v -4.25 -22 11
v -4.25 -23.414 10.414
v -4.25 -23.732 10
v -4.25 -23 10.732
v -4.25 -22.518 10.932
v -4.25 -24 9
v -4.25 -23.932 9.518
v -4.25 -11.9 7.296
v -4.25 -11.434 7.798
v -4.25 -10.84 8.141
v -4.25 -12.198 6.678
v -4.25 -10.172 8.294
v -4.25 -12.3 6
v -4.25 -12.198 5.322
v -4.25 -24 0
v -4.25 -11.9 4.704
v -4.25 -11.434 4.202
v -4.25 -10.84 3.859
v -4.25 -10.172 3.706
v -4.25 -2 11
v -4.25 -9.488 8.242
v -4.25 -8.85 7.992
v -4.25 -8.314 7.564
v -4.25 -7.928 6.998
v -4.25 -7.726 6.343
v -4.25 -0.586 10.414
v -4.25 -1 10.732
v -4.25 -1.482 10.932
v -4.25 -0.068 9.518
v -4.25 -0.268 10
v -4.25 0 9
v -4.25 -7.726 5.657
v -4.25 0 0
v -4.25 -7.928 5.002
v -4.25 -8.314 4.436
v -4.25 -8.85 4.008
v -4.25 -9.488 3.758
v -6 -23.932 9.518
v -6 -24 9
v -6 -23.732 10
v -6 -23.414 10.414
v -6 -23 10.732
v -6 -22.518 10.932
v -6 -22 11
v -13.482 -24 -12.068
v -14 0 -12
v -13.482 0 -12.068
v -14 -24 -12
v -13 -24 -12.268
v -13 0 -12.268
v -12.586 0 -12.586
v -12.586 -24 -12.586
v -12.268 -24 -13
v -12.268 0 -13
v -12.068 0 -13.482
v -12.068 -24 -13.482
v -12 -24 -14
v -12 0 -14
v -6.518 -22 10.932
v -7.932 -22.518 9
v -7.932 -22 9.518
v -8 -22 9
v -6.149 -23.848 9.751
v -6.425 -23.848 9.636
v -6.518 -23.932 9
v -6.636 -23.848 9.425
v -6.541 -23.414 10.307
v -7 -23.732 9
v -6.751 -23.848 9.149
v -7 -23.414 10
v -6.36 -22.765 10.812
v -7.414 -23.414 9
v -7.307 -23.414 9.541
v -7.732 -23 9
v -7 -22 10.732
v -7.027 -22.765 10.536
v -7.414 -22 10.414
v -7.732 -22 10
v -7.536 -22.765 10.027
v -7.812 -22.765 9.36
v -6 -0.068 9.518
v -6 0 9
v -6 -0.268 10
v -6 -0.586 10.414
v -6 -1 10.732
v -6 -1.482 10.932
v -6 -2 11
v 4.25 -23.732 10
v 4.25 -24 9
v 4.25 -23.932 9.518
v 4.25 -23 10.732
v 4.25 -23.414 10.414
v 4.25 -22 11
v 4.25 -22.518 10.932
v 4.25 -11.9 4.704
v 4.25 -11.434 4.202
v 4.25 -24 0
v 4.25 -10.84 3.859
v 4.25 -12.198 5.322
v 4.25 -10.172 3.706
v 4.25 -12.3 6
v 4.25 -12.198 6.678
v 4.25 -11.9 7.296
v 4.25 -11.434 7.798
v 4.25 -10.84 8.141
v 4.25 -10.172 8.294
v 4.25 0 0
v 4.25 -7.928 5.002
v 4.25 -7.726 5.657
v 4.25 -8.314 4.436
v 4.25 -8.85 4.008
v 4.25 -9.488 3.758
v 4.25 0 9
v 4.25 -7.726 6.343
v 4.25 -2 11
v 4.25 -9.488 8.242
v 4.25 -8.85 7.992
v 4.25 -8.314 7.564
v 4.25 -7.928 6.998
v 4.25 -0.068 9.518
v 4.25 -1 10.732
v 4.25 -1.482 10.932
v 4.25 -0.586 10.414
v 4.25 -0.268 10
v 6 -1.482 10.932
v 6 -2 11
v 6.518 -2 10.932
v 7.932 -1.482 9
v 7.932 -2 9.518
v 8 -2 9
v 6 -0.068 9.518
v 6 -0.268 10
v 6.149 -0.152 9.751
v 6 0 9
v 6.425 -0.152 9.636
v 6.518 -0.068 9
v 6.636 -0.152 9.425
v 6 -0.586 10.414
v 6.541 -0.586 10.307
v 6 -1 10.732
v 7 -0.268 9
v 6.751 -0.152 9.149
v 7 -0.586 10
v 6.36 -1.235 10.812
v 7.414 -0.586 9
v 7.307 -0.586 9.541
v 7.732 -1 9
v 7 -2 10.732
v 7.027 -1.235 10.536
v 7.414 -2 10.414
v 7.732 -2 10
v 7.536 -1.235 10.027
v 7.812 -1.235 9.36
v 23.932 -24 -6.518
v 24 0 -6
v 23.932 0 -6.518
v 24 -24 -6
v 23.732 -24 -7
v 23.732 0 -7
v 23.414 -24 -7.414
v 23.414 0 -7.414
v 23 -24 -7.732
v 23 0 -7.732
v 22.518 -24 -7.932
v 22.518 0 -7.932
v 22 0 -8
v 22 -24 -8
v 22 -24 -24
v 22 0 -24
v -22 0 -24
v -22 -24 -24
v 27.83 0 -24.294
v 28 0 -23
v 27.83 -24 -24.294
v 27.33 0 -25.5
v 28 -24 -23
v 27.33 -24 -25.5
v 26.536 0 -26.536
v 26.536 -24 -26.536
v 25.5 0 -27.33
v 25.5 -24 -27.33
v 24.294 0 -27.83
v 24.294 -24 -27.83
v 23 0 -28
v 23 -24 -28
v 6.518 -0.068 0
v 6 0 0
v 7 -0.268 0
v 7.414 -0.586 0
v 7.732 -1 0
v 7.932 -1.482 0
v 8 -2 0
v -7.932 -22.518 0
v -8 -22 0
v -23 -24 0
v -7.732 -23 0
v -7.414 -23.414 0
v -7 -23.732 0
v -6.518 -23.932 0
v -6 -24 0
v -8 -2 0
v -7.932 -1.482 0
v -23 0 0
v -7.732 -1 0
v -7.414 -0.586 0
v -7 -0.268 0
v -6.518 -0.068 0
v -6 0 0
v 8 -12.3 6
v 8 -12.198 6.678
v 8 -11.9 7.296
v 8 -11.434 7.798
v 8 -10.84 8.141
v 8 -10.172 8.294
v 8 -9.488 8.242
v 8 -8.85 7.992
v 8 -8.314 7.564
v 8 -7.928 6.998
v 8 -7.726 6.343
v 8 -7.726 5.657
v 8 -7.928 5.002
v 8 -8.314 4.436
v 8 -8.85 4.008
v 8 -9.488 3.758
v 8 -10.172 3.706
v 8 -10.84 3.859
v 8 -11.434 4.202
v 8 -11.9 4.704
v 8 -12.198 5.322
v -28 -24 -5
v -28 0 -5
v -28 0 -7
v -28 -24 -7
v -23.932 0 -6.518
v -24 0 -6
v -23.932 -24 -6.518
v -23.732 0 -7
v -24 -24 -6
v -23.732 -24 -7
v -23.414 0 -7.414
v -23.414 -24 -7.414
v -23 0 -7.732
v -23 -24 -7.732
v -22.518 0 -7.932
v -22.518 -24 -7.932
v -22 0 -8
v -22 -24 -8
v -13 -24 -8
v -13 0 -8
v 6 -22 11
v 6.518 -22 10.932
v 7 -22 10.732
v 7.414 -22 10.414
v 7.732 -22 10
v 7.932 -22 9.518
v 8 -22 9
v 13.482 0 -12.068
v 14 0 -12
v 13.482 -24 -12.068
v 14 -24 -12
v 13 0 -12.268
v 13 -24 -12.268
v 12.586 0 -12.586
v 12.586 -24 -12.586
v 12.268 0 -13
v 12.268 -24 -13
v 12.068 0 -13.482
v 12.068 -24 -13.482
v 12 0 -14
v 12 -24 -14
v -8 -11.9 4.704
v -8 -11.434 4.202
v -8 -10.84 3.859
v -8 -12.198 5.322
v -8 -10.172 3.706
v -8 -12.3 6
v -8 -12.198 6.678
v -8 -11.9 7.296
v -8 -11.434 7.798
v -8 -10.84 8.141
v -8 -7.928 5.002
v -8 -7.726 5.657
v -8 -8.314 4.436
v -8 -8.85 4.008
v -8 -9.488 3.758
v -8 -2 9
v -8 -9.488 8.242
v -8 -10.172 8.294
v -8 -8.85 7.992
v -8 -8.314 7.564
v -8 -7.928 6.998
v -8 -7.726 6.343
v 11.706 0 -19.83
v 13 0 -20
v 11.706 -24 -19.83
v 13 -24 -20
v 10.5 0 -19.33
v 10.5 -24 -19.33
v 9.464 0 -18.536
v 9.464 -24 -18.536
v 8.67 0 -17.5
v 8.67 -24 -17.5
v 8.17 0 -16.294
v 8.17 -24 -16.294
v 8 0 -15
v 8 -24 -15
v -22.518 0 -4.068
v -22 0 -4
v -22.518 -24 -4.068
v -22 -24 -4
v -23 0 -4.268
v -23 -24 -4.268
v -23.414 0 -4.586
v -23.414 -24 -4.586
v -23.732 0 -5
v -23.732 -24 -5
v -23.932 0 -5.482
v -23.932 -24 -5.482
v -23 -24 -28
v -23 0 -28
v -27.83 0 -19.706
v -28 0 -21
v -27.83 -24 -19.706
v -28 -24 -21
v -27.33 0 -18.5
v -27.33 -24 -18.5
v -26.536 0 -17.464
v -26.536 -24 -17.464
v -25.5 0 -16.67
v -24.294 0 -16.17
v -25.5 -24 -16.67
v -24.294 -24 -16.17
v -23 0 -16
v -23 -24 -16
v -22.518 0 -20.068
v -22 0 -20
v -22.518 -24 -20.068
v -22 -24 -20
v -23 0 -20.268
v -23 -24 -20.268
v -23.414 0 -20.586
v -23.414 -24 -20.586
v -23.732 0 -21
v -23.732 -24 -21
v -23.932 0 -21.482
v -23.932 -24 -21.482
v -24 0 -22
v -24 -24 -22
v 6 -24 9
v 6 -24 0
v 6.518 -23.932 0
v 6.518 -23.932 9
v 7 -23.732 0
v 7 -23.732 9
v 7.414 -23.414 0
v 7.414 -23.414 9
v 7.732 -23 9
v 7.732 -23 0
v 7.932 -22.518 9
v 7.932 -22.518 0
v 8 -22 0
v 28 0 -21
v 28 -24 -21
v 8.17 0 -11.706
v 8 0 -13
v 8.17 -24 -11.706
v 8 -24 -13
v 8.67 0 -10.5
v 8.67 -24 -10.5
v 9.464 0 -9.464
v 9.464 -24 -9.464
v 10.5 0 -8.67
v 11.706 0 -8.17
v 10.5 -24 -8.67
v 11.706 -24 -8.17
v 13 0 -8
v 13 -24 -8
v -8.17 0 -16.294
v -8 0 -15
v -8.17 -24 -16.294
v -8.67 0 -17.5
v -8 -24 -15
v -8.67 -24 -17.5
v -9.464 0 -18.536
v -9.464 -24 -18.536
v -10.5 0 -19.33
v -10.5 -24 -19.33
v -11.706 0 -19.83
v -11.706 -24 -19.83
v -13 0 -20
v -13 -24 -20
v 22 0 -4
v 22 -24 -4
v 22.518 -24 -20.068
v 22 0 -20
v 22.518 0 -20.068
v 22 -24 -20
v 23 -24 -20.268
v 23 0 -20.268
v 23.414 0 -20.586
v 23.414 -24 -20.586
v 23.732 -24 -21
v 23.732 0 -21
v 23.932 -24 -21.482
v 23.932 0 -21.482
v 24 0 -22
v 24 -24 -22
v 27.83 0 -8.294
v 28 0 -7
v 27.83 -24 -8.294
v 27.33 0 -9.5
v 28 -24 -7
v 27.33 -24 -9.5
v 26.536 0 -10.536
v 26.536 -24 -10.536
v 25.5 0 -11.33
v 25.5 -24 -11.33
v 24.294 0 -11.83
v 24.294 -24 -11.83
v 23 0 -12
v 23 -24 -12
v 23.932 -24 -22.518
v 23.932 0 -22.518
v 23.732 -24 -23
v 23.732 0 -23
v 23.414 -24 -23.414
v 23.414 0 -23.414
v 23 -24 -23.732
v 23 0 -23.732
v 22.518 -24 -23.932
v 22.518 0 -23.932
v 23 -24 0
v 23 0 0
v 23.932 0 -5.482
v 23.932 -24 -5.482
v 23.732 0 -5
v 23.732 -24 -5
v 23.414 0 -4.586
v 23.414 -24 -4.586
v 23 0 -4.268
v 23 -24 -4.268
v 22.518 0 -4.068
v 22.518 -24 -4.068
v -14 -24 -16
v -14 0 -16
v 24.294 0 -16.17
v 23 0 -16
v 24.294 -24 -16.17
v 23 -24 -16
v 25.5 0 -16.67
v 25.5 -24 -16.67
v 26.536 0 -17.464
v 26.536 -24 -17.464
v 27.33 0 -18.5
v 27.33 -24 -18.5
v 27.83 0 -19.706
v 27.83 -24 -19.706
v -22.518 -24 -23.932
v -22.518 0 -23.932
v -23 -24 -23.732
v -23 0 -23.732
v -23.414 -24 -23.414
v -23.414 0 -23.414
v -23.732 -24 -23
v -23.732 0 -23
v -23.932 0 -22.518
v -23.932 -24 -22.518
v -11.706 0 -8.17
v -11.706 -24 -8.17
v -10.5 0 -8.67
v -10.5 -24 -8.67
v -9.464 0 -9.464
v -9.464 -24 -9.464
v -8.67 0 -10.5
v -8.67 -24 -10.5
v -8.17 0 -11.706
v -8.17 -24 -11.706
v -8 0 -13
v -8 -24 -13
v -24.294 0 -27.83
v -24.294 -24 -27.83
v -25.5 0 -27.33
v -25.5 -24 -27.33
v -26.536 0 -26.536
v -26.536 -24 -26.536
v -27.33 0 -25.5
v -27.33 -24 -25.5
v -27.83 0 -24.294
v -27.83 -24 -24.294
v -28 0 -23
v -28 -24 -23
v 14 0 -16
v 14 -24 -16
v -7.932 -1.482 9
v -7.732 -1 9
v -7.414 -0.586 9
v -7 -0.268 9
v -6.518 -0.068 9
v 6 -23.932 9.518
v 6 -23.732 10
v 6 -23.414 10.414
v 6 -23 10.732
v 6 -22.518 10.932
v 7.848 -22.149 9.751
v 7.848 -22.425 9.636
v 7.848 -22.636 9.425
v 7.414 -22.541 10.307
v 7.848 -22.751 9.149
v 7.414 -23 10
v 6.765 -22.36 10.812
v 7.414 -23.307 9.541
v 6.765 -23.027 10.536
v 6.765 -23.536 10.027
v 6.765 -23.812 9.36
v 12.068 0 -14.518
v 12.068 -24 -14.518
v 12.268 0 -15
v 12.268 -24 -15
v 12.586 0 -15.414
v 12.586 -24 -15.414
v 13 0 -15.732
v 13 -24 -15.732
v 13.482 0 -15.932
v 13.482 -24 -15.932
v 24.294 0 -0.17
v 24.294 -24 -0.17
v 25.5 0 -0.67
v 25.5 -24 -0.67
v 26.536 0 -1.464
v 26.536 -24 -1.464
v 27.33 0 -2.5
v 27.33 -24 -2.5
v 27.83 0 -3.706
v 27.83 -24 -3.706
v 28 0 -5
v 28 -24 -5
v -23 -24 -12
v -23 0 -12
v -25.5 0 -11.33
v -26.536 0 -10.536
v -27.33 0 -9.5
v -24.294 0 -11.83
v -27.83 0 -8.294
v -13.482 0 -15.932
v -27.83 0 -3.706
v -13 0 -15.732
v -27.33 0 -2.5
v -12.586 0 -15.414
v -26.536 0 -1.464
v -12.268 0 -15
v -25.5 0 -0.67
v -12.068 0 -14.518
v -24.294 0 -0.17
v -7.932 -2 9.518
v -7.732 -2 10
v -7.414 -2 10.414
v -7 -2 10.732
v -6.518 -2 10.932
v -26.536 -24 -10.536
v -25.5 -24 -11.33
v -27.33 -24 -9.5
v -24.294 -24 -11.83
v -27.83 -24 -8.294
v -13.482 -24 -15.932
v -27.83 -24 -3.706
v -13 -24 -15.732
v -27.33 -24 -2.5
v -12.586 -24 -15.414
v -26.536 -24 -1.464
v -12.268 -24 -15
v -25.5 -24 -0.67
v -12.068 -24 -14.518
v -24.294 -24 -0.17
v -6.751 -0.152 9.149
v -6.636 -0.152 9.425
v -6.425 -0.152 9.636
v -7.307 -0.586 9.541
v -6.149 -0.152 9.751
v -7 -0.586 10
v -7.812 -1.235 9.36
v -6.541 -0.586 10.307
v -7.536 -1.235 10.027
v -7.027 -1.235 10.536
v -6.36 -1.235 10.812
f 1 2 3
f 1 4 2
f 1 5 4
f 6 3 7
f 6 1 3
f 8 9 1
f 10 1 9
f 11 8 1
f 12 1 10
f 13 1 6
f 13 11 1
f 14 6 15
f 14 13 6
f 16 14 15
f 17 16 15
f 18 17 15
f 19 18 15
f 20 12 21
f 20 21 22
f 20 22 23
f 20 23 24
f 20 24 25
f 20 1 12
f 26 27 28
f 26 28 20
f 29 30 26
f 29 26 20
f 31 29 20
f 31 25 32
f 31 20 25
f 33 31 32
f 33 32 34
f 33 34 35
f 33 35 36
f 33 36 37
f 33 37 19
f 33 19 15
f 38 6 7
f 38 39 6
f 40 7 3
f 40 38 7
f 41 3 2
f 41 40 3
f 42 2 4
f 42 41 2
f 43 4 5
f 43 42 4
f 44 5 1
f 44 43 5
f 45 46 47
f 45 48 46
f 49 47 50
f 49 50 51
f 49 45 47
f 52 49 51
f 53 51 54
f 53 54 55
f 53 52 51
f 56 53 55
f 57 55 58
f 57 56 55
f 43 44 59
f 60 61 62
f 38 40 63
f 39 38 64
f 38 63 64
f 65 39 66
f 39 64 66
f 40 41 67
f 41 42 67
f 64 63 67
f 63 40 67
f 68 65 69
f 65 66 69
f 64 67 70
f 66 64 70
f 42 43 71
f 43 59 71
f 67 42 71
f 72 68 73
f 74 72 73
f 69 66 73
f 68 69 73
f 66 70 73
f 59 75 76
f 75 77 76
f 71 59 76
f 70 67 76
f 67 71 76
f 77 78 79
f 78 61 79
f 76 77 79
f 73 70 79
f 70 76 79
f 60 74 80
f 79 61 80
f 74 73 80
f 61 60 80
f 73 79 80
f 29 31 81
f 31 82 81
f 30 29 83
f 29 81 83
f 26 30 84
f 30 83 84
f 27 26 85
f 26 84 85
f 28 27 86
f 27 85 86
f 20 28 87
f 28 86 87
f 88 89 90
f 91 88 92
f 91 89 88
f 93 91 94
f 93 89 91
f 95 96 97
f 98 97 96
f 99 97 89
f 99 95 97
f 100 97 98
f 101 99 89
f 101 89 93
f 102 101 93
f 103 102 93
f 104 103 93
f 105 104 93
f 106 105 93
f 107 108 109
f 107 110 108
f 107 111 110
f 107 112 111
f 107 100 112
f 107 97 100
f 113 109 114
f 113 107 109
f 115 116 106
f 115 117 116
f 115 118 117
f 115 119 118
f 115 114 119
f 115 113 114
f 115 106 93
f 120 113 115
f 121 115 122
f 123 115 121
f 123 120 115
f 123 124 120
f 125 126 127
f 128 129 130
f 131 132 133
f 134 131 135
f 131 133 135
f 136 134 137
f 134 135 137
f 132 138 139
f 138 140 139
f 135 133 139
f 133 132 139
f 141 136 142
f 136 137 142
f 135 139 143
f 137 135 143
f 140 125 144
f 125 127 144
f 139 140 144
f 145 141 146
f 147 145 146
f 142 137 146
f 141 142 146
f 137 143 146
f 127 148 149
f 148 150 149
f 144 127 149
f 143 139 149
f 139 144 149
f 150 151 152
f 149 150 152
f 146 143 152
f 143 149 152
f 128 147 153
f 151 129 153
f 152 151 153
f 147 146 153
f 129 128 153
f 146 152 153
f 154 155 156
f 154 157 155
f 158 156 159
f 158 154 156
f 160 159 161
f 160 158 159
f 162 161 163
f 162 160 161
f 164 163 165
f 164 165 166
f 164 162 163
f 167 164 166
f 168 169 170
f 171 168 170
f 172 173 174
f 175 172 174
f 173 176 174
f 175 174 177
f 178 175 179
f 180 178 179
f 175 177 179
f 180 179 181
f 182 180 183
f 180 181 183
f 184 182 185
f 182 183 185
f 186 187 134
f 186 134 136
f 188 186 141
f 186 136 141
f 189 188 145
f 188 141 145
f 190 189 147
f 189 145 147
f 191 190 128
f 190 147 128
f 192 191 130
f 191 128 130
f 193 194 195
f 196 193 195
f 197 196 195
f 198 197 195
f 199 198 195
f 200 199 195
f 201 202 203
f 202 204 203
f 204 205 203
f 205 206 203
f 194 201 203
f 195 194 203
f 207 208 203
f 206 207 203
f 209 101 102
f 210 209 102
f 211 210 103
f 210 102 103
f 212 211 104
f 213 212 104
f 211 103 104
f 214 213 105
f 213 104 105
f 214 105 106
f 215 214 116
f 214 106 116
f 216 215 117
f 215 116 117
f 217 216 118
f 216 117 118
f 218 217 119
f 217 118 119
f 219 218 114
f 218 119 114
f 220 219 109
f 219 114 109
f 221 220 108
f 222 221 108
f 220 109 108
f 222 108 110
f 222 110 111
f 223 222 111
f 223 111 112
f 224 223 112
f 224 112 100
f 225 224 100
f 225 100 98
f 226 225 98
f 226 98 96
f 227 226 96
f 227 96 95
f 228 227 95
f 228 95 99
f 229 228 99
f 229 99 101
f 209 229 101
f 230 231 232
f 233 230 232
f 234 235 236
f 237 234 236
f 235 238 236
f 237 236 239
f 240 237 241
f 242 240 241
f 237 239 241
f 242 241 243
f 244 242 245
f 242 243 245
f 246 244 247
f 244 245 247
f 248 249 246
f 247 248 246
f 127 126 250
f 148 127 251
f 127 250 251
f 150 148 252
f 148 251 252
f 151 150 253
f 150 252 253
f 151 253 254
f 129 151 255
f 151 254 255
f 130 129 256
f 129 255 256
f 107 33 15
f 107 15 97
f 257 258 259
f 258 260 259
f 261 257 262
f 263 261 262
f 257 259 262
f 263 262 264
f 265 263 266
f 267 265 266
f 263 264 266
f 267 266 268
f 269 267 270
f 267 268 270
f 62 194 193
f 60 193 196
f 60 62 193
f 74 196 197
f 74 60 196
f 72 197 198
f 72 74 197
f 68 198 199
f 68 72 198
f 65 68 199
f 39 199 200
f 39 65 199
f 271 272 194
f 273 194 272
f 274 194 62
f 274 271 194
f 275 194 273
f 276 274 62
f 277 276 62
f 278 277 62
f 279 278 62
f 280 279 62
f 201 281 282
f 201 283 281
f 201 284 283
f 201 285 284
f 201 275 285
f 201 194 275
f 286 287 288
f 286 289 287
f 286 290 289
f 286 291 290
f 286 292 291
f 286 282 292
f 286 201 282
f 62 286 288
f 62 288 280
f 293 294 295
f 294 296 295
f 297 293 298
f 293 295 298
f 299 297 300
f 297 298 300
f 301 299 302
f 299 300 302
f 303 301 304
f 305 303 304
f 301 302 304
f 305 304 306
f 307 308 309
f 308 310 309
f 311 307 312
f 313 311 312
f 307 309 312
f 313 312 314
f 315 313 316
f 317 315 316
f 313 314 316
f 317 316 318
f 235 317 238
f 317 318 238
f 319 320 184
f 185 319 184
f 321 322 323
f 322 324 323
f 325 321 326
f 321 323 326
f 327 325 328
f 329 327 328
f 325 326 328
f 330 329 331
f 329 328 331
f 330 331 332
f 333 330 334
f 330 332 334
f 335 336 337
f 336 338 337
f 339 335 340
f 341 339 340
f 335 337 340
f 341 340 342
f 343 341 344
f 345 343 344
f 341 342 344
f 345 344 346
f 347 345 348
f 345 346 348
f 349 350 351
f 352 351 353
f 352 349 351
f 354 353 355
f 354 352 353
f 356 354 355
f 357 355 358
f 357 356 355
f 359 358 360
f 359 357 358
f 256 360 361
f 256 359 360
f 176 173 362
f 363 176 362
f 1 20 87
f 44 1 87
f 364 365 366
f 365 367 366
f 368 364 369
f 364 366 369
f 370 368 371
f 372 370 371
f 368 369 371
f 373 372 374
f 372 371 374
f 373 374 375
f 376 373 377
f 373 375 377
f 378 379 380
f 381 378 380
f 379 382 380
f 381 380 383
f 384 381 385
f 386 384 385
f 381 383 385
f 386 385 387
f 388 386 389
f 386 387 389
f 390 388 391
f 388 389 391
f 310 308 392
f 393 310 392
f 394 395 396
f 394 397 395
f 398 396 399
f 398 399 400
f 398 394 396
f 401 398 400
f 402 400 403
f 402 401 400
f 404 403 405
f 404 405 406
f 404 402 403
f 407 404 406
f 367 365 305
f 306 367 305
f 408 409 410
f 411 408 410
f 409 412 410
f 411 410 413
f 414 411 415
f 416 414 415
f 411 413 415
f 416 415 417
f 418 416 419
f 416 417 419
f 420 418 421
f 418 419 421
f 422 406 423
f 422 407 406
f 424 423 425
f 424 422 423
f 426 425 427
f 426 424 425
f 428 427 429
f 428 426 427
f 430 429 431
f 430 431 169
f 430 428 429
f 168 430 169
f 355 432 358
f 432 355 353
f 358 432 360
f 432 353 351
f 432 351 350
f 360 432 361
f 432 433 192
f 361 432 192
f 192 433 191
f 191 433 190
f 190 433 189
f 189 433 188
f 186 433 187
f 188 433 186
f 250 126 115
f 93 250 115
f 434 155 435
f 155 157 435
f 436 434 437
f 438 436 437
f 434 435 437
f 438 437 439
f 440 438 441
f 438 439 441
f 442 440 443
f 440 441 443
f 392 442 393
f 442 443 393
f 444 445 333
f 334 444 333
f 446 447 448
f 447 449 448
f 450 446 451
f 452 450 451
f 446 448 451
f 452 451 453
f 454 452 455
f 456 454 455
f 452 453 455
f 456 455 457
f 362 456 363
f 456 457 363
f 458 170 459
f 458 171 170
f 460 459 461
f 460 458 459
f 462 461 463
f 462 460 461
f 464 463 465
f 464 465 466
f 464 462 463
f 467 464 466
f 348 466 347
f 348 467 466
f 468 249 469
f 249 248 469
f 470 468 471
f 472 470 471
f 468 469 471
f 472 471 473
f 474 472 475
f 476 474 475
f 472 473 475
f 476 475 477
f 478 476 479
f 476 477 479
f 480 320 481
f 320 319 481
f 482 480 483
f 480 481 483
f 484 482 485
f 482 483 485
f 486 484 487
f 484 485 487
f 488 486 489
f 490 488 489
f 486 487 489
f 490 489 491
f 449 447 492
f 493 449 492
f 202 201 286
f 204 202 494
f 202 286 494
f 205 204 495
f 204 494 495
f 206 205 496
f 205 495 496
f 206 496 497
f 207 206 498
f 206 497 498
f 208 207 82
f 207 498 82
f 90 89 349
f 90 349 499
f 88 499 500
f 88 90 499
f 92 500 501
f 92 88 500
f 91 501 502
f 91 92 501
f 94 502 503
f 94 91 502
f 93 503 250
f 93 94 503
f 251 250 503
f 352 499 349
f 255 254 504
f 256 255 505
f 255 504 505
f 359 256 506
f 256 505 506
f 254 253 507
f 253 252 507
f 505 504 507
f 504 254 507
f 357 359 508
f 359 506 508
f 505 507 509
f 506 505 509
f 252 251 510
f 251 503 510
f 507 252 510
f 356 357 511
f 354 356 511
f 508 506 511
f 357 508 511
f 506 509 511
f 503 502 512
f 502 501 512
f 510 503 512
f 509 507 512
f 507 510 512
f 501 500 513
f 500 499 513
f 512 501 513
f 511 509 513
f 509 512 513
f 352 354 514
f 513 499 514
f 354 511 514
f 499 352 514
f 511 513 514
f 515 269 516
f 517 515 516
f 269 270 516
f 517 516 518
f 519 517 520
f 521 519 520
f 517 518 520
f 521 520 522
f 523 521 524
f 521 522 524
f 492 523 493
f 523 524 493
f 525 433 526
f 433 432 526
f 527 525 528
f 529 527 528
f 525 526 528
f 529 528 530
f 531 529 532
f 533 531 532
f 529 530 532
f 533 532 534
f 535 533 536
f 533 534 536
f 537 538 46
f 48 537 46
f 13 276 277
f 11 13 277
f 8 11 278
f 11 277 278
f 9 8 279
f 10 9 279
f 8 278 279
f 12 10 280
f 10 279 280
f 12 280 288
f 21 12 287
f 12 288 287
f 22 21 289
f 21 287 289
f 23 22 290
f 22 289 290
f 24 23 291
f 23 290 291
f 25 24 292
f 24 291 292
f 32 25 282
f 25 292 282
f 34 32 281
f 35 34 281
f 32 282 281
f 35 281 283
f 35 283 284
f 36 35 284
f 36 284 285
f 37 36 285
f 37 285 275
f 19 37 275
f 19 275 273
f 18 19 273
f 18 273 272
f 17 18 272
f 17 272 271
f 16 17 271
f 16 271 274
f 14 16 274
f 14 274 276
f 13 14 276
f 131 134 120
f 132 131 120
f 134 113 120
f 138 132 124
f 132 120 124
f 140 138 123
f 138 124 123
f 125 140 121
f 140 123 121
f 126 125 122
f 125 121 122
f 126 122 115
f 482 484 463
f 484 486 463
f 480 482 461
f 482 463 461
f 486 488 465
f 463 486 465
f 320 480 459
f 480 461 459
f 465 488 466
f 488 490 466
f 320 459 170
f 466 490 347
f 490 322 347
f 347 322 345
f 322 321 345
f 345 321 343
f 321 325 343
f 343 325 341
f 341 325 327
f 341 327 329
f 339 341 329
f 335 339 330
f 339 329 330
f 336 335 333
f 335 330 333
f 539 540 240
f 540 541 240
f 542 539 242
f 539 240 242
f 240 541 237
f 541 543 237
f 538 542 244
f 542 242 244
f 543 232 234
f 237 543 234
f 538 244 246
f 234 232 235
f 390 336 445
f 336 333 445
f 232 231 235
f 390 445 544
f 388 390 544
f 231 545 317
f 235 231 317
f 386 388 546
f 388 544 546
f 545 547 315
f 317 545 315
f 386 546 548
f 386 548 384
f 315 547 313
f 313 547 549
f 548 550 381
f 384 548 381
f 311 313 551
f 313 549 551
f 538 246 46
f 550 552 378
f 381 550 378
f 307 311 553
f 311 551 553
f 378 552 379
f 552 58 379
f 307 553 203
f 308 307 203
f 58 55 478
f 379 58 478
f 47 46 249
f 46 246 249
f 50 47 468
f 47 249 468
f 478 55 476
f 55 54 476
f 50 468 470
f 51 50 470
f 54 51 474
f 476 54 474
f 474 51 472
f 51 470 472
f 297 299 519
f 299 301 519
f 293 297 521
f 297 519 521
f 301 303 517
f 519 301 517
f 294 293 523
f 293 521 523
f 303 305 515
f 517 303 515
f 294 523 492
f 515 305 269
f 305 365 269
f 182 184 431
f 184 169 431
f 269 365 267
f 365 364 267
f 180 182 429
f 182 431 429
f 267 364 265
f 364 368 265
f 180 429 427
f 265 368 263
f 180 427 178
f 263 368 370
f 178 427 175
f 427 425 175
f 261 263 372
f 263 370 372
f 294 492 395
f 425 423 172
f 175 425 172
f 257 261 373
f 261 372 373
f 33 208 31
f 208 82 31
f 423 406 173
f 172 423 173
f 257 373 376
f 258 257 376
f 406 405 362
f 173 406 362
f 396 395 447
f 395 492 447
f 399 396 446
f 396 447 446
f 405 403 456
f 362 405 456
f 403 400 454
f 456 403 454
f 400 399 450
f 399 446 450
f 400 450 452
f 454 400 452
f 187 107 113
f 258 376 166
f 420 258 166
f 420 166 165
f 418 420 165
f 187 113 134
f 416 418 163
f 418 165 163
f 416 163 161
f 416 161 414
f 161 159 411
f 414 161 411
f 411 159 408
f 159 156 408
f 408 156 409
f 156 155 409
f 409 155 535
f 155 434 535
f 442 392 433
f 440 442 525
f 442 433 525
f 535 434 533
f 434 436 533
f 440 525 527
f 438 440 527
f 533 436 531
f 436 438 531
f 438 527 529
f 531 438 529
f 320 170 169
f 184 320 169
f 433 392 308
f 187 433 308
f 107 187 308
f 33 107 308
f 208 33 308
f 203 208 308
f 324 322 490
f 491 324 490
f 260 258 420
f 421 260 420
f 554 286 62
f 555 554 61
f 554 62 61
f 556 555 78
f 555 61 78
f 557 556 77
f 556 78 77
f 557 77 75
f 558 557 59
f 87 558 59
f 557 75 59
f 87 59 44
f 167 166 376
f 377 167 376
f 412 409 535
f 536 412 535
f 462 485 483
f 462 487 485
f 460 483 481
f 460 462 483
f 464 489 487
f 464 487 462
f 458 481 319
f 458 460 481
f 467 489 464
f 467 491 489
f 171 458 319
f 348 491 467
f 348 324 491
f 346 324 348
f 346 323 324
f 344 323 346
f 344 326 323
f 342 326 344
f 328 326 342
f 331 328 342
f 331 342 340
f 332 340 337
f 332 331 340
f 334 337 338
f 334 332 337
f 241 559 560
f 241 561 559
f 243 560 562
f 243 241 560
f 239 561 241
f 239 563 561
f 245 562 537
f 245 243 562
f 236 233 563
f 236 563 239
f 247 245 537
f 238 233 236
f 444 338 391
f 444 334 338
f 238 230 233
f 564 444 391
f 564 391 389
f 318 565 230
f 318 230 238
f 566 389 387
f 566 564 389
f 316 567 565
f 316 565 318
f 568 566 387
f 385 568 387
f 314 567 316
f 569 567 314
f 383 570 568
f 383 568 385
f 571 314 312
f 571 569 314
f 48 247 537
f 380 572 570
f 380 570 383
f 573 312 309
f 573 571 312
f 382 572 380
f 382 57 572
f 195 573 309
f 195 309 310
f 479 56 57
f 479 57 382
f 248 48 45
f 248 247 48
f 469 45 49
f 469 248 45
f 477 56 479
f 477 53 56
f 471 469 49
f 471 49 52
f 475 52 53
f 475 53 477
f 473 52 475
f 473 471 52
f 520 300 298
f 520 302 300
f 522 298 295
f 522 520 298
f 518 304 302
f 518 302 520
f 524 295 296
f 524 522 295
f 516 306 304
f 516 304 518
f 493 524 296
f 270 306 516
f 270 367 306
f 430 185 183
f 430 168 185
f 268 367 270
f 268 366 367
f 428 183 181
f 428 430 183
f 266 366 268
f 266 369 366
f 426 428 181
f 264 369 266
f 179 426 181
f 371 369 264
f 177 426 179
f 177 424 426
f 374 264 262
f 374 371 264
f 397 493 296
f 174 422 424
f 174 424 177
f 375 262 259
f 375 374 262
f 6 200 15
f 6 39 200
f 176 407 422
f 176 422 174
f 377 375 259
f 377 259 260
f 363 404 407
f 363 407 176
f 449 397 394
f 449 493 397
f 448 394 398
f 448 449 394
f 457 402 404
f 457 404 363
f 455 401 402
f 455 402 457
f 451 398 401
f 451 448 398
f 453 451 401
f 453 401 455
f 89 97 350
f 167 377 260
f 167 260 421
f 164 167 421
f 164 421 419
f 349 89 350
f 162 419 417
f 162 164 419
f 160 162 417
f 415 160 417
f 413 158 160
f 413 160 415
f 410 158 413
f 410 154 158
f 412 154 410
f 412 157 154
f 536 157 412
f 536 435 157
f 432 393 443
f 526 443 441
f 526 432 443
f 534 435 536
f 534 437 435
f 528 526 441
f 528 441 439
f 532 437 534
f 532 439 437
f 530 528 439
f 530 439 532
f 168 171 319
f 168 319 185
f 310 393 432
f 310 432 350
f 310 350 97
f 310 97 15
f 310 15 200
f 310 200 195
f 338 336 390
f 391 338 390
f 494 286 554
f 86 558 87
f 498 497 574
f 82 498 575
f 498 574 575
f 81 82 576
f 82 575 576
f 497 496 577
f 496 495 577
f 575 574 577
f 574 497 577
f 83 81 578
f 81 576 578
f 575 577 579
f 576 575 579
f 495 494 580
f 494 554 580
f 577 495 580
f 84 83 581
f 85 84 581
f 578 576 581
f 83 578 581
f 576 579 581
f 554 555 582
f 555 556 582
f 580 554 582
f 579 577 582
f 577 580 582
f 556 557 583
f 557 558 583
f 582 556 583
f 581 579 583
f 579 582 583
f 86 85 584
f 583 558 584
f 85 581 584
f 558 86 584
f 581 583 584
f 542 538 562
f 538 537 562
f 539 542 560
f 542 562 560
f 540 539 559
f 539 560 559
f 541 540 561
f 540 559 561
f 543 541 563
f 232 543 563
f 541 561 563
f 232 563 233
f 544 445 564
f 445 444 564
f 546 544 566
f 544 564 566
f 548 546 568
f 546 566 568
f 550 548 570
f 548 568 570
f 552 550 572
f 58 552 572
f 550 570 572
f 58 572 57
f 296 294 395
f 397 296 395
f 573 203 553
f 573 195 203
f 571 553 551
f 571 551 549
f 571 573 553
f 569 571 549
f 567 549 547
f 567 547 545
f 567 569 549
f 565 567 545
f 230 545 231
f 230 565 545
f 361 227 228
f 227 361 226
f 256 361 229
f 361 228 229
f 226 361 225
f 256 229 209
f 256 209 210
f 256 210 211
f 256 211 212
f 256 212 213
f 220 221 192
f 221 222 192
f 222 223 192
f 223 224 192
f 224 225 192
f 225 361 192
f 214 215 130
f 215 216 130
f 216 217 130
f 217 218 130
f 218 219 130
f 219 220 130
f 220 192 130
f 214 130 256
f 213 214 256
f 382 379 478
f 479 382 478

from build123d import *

# Parameters (mm, degrees)
F0_W     = 3.75
F0_H     = 11
F1_DEPTH = 24
F3_DEPTH = 24.001
F4_D     = 4.6
F5_R     = 1.99999
F6_R     = 5


# Not quite as in the source:
# - a fillet or chamfer is up to 0.001 mm smaller than in the source, because OpenCascade refuses the exact size


with BuildPart() as f1:
    # F0 (on Front) → F1 (new body)
    with BuildSketch(Plane.XZ):
        Polygon((0, 0), (-4.25, 0), (-8, 0), (-28, 0), (-28, -12), (-12, -12), (-12, -16), (-28, -16), (-28, -28), (0, -28), (0, -24), (-8, -24), (-24, -24), (-24, -20), (-8, -20), (-8, -11), (-8, -8), (-24, -8), (-24, -4), (-8, -4), (0, -4), align=None)
        Polygon((28, 0), (8, 0), (8, -4), (24, -4), (24, -8), (8, -8), (8, -11), (8, -20), (24, -20), (24, -24), (8, -24), (0, -24), (0, -28), (28, -28), (28, -16), (12, -16), (12, -12), (28, -12), align=None)
        Polygon((8, -4), (8, 0), (4.25, 0), (0, 0), (0, -4), align=None)
        with Locations((6.125, 5.5)):
            Rectangle(F0_W, F0_H)
        Polygon((4.25, 0), (4.25, 11), (-4.25, 11), (-4.25, 0), (0, 0), align=None)
        with Locations((-6.125, 5.5)):
            Rectangle(F0_W, F0_H)
    extrude(amount=F1_DEPTH)

    # F0 (on Front) → F3 (cut, through all)
    with BuildSketch(Plane.XZ):
        Polygon((4.25, 0), (4.25, 11), (-4.25, 11), (-4.25, 0), (0, 0), align=None)
    extrude(amount=F3_DEPTH, mode=Mode.SUBTRACT)

    # F4 (through all)
    with Locations(Plane.YZ.offset(8)):
        with Locations((-10, 6)):
            Hole(F4_D / 2)

    # F5 (radius 2 in the source; OpenCascade refuses exactly that, so slightly less here)
    f5_edges = [f1.edges().sort_by_distance(p)[0] for p in [
        (12, -12, -16),
        (-24, -12, -24),
        (-24, -12, -8),
        (12, -12, -12),
        (24, -12, -8),
        (24, -12, -24),
        (-12, -12, -12),
        (24, -12, -20),
        (24, -12, -4),
        (-24, -12, -20),
        (-24, -12, -4),
        (-12, -12, -16),
        (-8, -12, 11),
        (-6.125, -24, 11),
        (6.125, -24, 11),
        (8, -12, 11),
        (-8, 0, 5.5),
        (-8, -24, 5.5),
        (-6.125, 0, 11),
        (6.125, 0, 11),
        (8, 0, 5.5),
        (8, -24, 5.5),
    ]]
    fillet(f5_edges, radius=F5_R)

    # F6
    f6_edges = [f1.edges().sort_by_distance(p)[0] for p in [
        (-28, -12, -28),
        (-28, -12, -16),
        (-28, -12, -12),
        (-28, -12, 0),
        (8, -12, -8),
        (8, -12, -20),
        (-8, -12, -8),
        (-8, -12, -20),
        (28, -12, 0),
        (28, -12, -12),
        (28, -12, -16),
        (28, -12, -28),
    ]]
    fillet(f6_edges, radius=F6_R)


solid = f1.part
